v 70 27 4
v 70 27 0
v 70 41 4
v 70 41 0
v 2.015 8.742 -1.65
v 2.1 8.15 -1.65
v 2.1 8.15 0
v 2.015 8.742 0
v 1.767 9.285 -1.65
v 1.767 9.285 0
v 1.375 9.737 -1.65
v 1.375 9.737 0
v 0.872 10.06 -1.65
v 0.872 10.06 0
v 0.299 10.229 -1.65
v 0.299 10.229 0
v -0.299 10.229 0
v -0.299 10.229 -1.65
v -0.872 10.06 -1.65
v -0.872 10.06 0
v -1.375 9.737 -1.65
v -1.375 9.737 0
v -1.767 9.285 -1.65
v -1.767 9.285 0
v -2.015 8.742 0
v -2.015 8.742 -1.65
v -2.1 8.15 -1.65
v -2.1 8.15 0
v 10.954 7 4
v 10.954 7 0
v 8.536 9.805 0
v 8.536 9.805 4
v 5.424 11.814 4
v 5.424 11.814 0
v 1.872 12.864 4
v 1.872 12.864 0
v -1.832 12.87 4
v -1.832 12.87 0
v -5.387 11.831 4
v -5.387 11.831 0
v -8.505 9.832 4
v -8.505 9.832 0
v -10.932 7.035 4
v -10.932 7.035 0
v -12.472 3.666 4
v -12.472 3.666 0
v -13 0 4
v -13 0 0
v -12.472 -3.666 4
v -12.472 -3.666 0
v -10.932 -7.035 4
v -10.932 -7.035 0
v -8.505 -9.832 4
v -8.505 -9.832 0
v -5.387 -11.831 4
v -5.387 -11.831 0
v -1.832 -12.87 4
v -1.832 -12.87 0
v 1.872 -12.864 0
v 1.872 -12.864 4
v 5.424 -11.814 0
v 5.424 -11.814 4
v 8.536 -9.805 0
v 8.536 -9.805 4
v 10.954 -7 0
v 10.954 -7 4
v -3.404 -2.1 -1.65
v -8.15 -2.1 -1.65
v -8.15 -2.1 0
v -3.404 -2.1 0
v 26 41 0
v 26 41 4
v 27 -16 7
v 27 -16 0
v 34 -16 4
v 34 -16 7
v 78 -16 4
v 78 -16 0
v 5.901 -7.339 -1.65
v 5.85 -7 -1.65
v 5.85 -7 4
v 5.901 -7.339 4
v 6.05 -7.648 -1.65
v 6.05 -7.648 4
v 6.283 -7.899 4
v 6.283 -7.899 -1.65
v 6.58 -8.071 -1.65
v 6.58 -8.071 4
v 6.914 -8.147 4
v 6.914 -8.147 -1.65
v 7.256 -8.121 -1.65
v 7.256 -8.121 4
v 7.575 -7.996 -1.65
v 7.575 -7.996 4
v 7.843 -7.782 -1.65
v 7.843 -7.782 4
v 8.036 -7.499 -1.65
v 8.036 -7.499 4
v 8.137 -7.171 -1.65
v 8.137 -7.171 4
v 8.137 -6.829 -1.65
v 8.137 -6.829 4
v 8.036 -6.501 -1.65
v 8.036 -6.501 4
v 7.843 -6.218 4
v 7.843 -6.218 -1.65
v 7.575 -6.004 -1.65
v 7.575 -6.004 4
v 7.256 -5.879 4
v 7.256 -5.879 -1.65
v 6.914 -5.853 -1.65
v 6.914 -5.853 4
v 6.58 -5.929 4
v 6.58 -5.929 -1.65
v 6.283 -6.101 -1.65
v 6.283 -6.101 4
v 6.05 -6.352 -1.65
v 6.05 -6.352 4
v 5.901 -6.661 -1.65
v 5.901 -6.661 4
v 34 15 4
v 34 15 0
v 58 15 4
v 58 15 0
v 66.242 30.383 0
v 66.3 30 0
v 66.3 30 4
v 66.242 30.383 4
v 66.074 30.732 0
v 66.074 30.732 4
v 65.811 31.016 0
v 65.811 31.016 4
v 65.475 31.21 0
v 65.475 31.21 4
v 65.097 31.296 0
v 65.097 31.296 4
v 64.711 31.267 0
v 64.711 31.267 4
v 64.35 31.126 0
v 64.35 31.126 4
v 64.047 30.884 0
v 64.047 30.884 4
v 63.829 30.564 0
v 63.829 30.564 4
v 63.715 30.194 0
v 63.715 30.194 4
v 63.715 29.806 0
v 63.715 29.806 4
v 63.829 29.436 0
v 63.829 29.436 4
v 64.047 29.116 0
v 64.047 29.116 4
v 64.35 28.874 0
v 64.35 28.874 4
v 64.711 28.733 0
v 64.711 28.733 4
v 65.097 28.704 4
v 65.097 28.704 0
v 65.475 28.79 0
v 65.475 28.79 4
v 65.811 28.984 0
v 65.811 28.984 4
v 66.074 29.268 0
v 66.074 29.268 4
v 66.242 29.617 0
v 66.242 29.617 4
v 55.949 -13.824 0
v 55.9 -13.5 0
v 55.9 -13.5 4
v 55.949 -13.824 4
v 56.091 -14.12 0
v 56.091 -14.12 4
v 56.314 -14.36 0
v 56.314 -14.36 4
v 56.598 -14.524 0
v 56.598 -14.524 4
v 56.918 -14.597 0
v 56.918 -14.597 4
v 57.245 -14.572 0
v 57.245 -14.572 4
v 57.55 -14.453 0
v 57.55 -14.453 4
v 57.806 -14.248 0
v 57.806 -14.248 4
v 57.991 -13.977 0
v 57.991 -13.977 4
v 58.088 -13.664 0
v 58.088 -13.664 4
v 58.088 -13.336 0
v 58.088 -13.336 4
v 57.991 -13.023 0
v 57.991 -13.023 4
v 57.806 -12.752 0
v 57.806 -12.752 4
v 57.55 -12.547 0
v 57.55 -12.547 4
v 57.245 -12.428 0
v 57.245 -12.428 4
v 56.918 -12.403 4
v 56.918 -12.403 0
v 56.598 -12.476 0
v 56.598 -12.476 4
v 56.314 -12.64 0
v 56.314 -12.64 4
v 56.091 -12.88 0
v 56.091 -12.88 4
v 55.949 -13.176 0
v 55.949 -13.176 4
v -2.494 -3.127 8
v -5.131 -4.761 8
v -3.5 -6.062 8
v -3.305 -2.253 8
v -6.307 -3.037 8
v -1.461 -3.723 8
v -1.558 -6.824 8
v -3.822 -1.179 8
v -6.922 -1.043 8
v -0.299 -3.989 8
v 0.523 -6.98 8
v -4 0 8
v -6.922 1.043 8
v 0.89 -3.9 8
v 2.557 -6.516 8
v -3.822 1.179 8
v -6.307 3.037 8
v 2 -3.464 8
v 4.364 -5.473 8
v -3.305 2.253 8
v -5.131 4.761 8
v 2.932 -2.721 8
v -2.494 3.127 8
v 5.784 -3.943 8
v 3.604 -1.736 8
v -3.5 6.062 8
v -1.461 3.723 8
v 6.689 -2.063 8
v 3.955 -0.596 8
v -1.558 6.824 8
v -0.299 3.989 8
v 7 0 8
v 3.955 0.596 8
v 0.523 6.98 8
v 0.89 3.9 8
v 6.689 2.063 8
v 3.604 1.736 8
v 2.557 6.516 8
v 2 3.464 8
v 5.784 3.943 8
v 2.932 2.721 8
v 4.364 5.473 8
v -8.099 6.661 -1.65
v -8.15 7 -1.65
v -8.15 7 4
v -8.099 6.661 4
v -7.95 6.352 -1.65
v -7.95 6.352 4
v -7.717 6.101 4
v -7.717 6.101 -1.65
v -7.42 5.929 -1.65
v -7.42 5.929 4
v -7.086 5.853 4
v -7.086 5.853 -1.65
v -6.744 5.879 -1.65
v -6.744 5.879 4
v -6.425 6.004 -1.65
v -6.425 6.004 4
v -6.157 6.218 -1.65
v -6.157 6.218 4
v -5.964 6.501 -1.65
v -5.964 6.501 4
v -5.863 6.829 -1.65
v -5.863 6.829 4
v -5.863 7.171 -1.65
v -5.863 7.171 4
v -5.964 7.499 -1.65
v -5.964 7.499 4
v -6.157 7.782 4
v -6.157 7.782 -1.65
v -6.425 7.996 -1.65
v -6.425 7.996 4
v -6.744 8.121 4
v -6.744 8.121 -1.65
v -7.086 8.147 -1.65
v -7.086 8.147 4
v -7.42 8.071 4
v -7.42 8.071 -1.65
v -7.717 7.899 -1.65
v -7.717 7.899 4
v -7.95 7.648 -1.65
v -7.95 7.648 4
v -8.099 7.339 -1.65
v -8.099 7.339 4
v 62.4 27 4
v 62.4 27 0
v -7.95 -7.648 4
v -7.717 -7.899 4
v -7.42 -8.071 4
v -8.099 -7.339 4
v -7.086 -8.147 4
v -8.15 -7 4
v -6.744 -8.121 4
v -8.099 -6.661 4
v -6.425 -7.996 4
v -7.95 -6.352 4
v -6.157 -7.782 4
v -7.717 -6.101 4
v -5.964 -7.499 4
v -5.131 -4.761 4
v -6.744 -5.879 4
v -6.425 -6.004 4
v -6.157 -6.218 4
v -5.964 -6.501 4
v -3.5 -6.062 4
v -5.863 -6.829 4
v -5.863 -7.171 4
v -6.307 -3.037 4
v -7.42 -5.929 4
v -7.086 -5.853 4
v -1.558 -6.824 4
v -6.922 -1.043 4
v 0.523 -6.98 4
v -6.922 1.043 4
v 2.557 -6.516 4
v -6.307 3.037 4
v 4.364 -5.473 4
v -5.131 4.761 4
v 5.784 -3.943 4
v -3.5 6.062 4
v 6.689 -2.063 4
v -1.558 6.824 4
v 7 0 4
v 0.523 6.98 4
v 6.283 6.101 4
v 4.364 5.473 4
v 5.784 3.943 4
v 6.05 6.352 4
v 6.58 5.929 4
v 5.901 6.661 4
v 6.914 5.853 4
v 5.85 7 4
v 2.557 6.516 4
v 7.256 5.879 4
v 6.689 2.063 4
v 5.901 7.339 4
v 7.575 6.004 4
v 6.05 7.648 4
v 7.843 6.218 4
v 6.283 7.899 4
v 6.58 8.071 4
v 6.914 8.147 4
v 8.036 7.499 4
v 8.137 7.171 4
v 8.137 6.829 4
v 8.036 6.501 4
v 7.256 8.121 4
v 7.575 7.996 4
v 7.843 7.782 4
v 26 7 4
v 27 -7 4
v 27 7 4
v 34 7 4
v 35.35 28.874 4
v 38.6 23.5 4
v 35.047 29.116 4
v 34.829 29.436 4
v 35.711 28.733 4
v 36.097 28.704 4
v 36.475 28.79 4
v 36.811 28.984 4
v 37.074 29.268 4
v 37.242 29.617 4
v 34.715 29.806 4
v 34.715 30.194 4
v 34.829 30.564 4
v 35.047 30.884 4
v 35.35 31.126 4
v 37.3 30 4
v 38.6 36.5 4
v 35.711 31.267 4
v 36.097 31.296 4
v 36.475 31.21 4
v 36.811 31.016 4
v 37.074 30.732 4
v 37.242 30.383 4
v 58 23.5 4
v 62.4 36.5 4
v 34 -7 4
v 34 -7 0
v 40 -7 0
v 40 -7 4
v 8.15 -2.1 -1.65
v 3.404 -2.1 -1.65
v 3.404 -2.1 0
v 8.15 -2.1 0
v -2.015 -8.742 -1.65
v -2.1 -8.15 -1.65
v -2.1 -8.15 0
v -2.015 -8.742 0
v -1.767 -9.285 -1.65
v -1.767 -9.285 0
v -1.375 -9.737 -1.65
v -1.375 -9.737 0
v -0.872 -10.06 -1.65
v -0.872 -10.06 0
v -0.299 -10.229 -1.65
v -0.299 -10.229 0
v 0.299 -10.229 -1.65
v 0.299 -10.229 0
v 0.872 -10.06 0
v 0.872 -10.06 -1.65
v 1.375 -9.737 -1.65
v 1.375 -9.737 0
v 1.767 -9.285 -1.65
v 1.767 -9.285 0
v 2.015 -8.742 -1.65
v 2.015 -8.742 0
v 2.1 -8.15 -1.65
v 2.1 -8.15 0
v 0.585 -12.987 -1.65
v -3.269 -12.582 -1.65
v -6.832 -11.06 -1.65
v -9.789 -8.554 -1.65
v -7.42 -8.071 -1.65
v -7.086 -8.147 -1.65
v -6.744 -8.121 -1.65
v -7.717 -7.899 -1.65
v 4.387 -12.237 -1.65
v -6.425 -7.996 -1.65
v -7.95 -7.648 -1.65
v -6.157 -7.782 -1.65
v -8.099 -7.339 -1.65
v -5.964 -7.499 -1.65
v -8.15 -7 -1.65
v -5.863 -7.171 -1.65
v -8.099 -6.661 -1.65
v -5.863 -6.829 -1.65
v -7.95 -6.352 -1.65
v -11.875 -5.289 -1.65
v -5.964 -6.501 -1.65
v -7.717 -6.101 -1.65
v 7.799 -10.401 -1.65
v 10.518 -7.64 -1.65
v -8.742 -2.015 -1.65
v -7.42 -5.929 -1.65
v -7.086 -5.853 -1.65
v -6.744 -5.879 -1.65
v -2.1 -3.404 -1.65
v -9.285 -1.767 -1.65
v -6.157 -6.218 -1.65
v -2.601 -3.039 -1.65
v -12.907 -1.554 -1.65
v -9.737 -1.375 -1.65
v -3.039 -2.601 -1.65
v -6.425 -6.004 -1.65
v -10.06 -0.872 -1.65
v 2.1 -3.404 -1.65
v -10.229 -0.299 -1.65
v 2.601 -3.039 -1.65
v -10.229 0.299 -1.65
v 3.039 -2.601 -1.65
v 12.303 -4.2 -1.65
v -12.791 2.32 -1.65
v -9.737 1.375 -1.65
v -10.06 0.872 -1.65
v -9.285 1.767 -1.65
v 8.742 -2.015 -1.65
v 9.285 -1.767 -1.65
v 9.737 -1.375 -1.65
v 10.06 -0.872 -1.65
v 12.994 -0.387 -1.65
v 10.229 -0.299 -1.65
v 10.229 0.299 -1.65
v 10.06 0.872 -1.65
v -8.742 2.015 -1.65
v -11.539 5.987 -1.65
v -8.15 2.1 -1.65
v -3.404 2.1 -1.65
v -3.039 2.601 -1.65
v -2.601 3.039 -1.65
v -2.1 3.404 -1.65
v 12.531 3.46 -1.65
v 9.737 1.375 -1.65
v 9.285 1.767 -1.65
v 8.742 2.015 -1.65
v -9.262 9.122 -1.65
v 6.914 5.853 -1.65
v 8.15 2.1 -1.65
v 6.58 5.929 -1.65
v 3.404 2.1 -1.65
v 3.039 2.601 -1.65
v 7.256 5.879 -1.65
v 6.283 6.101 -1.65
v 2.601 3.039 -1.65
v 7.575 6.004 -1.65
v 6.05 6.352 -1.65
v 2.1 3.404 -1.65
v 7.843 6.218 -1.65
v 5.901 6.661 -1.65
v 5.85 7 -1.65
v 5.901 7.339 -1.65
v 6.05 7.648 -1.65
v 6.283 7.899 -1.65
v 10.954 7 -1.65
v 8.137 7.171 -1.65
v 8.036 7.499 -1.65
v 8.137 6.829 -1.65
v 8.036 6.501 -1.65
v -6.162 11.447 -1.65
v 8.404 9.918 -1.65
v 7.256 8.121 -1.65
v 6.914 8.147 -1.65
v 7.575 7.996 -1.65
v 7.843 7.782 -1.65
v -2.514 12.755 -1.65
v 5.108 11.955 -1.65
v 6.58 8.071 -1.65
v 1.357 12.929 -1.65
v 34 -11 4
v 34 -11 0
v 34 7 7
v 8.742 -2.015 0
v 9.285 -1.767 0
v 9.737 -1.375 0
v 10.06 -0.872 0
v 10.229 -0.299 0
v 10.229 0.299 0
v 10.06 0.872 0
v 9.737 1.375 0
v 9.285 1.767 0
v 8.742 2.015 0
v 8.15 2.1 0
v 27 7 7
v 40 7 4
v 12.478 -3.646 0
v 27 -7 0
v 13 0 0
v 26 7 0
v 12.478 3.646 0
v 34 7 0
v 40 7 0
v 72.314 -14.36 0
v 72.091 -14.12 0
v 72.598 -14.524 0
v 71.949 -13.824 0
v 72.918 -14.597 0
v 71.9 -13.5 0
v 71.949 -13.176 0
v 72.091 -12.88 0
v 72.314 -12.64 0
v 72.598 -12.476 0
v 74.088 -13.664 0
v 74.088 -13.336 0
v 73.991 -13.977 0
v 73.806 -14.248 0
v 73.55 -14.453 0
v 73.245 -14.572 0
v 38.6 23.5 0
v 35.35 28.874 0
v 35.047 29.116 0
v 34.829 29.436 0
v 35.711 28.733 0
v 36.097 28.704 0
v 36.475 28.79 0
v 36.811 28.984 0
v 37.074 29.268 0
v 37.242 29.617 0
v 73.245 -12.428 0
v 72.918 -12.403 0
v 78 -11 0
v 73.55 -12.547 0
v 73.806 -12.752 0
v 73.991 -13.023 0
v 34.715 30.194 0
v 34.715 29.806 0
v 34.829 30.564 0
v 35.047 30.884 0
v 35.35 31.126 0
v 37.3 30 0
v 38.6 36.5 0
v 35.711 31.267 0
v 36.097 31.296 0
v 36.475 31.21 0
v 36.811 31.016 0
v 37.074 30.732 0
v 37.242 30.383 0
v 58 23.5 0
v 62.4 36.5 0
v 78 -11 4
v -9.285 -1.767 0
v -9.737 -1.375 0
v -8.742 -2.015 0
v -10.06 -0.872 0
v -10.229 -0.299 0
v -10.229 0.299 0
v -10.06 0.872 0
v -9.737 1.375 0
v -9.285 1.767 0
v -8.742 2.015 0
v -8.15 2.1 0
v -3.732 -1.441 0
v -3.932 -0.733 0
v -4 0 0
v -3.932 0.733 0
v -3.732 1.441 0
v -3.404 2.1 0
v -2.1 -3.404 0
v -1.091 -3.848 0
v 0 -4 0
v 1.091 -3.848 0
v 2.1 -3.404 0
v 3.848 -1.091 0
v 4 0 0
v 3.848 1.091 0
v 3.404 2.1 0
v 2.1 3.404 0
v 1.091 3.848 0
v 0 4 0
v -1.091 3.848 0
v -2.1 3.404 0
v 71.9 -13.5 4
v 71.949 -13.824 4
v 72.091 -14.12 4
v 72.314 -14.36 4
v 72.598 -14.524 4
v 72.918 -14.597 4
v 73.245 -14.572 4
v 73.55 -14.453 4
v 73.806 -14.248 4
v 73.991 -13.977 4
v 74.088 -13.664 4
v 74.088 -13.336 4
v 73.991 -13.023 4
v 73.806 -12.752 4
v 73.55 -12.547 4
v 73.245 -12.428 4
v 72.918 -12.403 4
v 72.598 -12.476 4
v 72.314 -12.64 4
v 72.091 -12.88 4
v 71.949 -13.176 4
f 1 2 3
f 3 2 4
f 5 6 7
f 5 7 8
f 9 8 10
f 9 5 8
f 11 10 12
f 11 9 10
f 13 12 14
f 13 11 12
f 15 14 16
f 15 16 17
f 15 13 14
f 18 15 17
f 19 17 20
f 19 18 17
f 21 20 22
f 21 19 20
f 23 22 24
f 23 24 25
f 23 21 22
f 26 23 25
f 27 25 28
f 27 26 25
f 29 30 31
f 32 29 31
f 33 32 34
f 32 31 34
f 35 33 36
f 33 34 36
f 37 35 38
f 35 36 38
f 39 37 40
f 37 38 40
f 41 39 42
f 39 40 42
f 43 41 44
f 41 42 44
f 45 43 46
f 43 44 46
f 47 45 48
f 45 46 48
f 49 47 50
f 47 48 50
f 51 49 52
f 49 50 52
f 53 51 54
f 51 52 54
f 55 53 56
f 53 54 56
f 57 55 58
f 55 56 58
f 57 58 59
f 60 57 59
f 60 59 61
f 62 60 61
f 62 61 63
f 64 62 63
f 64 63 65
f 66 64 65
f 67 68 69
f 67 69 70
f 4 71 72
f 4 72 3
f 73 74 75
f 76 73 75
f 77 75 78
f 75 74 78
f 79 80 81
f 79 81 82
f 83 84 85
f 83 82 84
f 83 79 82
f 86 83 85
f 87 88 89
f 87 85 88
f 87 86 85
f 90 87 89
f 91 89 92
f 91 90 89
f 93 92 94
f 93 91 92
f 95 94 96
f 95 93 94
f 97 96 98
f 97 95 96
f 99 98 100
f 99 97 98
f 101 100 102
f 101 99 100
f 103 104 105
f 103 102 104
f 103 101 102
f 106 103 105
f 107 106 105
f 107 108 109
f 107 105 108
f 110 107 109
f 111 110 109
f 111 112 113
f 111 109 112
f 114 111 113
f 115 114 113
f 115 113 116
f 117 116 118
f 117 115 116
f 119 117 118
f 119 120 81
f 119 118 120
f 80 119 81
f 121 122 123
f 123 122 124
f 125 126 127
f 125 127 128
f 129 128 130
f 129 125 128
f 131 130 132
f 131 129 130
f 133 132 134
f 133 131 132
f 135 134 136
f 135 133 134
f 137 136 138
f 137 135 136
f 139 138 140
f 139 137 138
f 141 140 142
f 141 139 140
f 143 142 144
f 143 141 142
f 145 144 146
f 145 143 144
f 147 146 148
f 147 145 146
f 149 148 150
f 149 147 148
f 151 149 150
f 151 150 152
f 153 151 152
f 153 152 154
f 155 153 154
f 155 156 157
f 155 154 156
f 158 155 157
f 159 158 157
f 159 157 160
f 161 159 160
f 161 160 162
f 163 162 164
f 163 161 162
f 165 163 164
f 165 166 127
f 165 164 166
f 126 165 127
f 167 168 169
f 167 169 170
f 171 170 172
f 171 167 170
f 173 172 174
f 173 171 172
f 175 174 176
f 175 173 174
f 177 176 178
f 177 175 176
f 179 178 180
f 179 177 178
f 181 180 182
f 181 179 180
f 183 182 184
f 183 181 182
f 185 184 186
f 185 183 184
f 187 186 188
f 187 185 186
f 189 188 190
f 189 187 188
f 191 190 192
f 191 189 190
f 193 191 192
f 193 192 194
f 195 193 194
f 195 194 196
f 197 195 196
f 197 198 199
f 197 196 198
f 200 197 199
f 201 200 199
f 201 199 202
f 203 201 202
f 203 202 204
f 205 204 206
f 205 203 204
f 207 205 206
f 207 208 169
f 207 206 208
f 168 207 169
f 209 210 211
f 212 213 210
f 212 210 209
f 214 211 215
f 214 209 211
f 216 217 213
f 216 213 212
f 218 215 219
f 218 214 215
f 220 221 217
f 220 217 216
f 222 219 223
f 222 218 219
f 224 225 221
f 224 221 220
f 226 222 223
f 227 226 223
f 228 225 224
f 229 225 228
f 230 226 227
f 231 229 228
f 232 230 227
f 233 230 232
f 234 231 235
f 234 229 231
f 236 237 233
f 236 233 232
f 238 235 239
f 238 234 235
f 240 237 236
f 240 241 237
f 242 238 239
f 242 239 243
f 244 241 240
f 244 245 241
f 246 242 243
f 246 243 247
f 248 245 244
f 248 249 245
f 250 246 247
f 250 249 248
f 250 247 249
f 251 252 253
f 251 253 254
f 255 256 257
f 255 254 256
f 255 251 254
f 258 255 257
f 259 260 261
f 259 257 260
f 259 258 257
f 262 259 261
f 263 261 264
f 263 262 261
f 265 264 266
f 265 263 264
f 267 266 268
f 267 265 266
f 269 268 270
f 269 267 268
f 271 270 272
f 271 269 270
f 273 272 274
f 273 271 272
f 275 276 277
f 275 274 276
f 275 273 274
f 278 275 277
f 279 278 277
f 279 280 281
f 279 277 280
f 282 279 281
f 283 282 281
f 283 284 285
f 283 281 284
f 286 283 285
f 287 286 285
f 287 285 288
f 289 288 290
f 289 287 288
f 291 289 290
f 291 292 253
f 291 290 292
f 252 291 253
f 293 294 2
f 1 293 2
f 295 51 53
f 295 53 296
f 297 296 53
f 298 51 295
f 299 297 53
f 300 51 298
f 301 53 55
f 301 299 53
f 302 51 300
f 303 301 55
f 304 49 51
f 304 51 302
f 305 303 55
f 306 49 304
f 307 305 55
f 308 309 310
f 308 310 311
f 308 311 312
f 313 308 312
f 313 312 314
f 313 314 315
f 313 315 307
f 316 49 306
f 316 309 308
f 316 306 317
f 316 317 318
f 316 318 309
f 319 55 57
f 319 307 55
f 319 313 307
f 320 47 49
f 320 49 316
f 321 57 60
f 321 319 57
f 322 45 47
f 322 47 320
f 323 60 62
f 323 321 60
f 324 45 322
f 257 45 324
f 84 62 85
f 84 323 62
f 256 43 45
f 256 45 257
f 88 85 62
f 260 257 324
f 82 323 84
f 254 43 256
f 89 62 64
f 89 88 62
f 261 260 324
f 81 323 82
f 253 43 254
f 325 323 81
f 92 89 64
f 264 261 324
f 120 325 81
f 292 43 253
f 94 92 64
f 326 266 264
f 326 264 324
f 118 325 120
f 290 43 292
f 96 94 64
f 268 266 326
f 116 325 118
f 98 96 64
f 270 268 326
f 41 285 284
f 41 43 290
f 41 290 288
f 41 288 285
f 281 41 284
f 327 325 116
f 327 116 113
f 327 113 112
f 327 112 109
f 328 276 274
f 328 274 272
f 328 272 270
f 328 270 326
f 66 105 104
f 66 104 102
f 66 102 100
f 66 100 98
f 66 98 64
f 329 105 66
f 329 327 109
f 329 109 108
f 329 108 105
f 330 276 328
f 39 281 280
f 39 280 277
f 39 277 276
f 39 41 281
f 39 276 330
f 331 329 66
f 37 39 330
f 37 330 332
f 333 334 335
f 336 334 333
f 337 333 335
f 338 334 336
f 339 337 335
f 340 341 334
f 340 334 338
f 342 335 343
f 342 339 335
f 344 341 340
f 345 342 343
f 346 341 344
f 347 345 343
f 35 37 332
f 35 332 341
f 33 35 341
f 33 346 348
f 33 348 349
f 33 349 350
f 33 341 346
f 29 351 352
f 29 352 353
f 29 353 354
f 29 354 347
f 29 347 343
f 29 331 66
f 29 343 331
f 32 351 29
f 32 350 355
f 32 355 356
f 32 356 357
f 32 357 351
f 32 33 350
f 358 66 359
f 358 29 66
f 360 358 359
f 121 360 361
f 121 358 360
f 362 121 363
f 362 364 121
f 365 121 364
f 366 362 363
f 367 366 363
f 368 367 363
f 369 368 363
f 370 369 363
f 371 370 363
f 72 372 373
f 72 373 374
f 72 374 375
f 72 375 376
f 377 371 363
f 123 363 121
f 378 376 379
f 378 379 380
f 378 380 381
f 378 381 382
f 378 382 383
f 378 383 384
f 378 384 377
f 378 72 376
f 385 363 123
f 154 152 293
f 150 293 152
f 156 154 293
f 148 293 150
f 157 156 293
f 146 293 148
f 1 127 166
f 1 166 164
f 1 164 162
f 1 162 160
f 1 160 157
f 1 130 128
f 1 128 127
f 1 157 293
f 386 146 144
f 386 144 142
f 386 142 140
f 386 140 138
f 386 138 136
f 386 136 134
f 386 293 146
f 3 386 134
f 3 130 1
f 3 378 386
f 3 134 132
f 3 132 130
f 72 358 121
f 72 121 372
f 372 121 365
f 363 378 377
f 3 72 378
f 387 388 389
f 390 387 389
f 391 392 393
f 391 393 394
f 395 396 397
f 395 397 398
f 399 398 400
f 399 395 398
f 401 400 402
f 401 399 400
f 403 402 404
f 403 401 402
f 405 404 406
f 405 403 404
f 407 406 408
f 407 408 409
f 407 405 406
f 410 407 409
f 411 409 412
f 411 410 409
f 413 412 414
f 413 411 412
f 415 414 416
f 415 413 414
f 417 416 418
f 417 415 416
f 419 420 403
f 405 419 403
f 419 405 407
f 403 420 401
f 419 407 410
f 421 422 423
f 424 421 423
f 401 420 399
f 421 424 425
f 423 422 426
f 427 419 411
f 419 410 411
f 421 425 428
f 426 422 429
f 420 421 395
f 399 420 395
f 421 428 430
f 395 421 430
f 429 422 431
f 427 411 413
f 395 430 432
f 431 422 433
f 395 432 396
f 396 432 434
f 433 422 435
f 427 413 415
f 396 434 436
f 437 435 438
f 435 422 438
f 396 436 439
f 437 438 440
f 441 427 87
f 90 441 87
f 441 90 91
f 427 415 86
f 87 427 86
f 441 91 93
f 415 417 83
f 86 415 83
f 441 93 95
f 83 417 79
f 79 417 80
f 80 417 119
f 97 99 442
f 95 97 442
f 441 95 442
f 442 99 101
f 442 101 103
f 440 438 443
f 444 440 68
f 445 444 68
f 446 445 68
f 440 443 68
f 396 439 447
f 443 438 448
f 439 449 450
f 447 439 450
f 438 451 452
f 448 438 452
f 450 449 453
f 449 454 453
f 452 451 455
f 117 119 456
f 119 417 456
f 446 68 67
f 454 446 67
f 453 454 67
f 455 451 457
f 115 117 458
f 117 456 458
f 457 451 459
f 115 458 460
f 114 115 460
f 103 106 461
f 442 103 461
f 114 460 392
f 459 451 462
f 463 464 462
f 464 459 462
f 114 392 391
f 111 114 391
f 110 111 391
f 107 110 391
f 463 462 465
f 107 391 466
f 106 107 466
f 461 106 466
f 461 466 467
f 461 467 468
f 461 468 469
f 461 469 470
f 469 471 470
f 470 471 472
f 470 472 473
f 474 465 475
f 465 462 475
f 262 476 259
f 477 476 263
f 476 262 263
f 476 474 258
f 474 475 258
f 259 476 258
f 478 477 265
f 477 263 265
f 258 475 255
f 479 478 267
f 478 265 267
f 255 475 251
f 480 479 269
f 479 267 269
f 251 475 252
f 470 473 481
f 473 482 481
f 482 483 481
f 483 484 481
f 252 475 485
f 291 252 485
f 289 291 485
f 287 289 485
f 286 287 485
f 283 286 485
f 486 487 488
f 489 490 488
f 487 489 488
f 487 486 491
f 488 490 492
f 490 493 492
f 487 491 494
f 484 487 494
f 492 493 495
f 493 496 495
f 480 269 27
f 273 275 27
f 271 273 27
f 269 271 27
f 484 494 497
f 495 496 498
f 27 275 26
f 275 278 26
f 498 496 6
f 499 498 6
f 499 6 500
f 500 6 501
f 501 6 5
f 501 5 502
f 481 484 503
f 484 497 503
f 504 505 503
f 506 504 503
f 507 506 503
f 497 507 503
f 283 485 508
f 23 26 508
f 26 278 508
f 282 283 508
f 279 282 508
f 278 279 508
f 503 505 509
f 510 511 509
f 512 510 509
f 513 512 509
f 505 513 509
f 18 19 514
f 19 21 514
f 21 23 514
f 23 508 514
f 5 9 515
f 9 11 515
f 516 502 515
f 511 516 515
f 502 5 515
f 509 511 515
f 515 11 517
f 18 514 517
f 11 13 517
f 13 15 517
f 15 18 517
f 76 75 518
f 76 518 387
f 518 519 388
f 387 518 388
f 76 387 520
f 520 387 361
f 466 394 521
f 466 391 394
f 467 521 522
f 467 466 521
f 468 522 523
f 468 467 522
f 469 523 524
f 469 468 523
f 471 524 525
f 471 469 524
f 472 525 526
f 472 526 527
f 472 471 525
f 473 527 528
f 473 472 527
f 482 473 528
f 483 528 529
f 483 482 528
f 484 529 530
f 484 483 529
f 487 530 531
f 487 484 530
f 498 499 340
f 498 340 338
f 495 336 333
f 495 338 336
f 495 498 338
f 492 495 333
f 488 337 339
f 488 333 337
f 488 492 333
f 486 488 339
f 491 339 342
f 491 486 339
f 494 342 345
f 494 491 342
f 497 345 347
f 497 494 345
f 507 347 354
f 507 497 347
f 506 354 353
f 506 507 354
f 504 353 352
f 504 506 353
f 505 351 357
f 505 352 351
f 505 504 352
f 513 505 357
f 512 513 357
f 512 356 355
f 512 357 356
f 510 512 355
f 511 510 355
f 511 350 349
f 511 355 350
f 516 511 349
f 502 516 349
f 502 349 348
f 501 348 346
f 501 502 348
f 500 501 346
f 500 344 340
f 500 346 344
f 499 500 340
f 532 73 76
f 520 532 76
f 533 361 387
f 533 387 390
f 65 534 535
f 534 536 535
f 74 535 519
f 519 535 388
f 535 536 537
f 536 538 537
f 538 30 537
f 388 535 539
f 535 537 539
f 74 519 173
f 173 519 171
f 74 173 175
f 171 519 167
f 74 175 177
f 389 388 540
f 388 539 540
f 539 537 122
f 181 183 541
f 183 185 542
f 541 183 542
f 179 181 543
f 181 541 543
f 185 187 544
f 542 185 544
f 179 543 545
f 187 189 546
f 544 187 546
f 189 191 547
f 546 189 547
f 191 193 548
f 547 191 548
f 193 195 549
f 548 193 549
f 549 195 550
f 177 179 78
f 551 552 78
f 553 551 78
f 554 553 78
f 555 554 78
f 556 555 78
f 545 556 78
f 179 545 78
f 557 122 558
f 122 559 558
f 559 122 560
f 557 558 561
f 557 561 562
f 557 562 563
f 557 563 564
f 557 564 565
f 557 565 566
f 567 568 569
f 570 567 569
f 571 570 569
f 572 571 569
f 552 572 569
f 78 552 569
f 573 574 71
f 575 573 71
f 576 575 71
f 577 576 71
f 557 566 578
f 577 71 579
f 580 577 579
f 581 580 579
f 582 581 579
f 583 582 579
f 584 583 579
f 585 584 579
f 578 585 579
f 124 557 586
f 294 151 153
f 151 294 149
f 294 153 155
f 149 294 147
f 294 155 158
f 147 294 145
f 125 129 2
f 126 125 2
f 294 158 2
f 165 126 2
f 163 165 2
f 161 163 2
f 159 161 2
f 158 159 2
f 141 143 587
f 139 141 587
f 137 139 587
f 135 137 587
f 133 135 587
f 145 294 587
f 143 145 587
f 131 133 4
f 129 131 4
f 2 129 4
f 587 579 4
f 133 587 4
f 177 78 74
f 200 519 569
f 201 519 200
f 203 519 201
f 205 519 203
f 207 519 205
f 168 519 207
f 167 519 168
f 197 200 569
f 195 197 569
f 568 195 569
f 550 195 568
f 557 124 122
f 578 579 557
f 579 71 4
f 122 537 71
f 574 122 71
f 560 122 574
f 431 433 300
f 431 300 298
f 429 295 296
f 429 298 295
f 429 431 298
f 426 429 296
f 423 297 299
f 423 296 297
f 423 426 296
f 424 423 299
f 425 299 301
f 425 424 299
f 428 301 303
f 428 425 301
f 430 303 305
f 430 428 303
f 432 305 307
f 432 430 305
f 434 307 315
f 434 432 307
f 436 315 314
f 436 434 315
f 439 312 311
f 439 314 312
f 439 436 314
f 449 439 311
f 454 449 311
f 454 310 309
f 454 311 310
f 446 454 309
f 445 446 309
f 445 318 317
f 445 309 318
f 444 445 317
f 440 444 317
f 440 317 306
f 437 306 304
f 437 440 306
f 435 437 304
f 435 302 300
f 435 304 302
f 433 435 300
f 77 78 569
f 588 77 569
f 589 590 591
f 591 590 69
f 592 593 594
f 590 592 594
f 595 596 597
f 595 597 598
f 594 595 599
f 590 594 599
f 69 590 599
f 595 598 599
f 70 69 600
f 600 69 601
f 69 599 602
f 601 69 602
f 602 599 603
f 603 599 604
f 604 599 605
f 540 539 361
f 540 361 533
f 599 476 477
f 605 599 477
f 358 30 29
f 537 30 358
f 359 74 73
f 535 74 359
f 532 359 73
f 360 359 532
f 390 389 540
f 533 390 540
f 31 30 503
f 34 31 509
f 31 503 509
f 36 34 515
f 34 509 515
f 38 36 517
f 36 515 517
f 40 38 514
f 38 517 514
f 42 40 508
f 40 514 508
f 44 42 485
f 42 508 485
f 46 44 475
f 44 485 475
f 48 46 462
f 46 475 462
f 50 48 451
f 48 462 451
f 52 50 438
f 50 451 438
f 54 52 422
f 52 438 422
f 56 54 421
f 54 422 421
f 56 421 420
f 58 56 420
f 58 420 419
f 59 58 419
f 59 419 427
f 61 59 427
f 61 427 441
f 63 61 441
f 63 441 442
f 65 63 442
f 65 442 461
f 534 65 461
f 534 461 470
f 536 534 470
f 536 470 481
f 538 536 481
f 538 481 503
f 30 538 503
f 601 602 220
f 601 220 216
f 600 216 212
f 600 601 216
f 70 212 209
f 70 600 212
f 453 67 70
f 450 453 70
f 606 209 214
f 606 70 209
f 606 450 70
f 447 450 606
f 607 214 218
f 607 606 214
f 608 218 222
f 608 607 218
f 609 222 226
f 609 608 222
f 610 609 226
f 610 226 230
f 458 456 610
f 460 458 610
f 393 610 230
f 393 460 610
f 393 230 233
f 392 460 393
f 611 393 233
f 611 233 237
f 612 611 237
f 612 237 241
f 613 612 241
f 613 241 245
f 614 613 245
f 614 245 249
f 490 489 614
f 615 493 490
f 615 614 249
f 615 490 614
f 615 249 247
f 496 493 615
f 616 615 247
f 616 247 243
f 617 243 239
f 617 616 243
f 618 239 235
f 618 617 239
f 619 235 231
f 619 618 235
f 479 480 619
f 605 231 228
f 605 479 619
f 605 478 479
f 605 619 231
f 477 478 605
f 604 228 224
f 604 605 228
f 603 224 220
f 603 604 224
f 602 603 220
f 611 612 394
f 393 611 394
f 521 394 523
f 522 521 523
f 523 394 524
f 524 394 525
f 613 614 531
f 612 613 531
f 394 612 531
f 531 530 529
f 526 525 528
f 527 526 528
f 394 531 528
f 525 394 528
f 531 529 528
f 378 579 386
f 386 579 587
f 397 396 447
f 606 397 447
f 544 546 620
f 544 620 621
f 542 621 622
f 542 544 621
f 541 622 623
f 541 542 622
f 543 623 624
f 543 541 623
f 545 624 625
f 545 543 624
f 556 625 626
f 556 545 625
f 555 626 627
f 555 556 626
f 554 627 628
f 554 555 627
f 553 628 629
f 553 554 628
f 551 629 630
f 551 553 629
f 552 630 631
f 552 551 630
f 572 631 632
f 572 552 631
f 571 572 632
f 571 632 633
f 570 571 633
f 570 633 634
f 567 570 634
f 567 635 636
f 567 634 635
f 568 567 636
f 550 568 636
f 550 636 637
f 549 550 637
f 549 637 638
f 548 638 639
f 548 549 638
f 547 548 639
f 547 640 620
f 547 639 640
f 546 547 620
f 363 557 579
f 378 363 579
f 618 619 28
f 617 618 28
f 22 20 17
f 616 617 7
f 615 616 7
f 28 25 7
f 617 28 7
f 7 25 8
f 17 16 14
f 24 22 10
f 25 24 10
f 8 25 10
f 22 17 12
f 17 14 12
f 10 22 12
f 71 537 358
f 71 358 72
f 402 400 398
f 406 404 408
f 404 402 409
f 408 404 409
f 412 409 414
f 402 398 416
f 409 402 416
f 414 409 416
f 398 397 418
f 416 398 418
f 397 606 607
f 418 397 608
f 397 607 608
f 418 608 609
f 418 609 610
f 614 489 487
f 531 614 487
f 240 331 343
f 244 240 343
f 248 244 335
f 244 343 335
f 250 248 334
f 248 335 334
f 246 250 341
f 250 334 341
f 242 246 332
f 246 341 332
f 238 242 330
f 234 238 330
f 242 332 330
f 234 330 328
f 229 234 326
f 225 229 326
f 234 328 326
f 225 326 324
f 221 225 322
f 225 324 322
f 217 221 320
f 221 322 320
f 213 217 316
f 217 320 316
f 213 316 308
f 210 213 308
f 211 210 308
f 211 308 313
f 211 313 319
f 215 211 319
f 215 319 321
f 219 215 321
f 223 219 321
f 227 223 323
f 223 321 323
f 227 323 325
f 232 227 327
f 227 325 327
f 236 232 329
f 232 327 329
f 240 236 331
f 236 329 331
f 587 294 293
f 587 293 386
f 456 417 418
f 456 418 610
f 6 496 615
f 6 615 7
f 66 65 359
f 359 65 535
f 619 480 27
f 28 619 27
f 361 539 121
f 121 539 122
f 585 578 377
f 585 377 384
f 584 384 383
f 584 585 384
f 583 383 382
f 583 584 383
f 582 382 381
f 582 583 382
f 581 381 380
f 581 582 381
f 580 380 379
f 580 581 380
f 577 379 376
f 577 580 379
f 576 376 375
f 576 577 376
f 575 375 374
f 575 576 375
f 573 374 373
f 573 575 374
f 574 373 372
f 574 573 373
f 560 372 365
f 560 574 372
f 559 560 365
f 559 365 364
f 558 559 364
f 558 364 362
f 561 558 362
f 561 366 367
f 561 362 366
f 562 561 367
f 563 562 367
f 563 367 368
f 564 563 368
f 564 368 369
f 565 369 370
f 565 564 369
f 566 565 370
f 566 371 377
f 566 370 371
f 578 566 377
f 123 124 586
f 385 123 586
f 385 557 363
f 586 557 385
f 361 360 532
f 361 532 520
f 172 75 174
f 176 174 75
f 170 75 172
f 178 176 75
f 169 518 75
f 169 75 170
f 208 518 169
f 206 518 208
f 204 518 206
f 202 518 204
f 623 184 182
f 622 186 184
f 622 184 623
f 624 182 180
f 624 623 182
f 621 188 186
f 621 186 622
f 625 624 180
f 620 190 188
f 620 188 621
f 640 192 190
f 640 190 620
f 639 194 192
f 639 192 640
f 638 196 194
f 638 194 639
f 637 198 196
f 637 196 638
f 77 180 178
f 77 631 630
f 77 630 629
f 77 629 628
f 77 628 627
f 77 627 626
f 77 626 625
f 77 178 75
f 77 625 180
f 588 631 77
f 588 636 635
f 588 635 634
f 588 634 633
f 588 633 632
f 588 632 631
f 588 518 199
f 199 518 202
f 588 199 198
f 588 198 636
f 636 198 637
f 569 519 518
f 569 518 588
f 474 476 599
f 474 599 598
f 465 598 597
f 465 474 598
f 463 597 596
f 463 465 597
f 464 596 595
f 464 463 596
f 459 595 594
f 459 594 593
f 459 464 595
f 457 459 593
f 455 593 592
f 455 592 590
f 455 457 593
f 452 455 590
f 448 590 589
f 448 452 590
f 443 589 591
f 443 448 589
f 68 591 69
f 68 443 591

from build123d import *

# Parameters (mm, degrees)
ELBOW_HORN_FLANGE_PROFILE_R          = 13
ELBOW_HORN_FLANGE_DEPTH              = 4
FOREARM_WEB_PROFILE_W                = 40
FOREARM_WEB_PROFILE_H                = 14
FOREARM_WEB_DEPTH                    = 4
GRIPPER_MOUNT_RIB_PROFILE_W          = 8
GRIPPER_MOUNT_RIB_PROFILE_H          = 30
GRIPPER_MOUNT_RIB_DEPTH              = 4
GRIPPER_SERVO_MOUNT_PROFILE_W        = 44
GRIPPER_SERVO_MOUNT_PROFILE_H        = 26
GRIPPER_SERVO_MOUNT_DEPTH            = 4
GRIP_SG90_BODY_CLEARANCE_START       = -5
GRIP_SG90_BODY_CLEARANCE_PROFILE_W   = 23.8
GRIP_SG90_BODY_CLEARANCE_PROFILE_H   = 13
GRIP_SG90_BODY_CLEARANCE_DEPTH       = 87.221918224
MOVING_FINGER_SWEEP_RELIEF_START     = -5
MOVING_FINGER_SWEEP_RELIEF_PROFILE_W = 13
MOVING_FINGER_SWEEP_RELIEF_PROFILE_H = 13
MOVING_FINGER_SWEEP_RELIEF_DEPTH     = 87.221918224
GRIP_SERVO_TAB_FASTENERS_START       = -50
GRIP_SERVO_TAB_FASTENERS_PROFILE_R   = 1.3
GRIP_SERVO_TAB_FASTENERS_DEPTH       = 132.221918224
FIXED_FINGER_SPINE_PROFILE_W         = 48
FIXED_FINGER_SPINE_PROFILE_H         = 5
FIXED_FINGER_SPINE_DEPTH             = 4
FIXED_FINGER_ROOT_PROFILE_W          = 7
FIXED_FINGER_ROOT_PROFILE_H          = 23
FIXED_FINGER_ROOT_DEPTH              = 7
ELBOW_CENTER_SCREW_ACCESS_START      = -50
ELBOW_CENTER_SCREW_ACCESS_PROFILE_R  = 4
ELBOW_CENTER_SCREW_ACCESS_DEPTH      = 139.396832522
ELBOW_DOWEL_SUPPORT_HUB_START        = 4
ELBOW_DOWEL_SUPPORT_HUB_PROFILE_R    = 7
ELBOW_DOWEL_SUPPORT_HUB_PROFILE_R_2  = 4
ELBOW_DOWEL_SUPPORT_HUB_DEPTH        = 4
CAPTURED_HORN_KEY_BOSS_START         = -1.65
CAPTURED_HORN_KEY_BOSS_PROFILE_R     = 13
CAPTURED_HORN_KEY_BOSS_DEPTH         = 1.65
KEY_POCKET_HUB_START                 = -1.65
STOCK_HORN_POCKET_HUB_R              = 3.55
KEY_POCKET_HUB_DEPTH                 = 1.65
KEY_POCKET_HORIZONTAL_START          = -1.65
STOCK_HORN_POCKET_HORIZONTAL_W       = 16.3
STOCK_HORN_POCKET_HORIZONTAL_H       = 4.2
KEY_POCKET_HORIZONTAL_DEPTH          = 1.65
KEY_POCKET_VERTICAL_START            = -1.65
STOCK_HORN_POCKET_VERTICAL_W         = 4.2
STOCK_HORN_POCKET_VERTICAL_H         = 16.3
KEY_POCKET_VERTICAL_DEPTH            = 1.65
KEY_POCKET_ROUNDED_TIPS_START        = -1.65
STOCK_HORN_POCKET_ROUNDED_TIPS_R     = 2.1
KEY_POCKET_ROUNDED_TIPS_DEPTH        = 1.65
UNMODIFIED_HORN_CAPTURE_M2_START     = -50
UNMODIFIED_HORN_CAPTURE_M2_PROFILE_R = 1.15
UNMODIFIED_HORN_CAPTURE_M2_DEPTH     = 139.481636513
HUB_CLEARANCE_IN_KEY_BOSS_ONLY_START = -1.65
HORN_CENTER_HUB_CLEARANCE_R          = 4
HUB_CLEARANCE_IN_KEY_BOSS_ONLY_DEPTH = 1.65
FIXED_PAD_KEEPER_FASTENERS_START     = -50
FIXED_PAD_KEEPER_FASTENERS_PROFILE_R = 1.1
FIXED_PAD_KEEPER_FASTENERS_DEPTH     = 139.481636513


with BuildPart() as part:
    # Elbow_horn_flange_profile → Elbow_horn_flange (new body)
    with BuildSketch(Plane.XY):
        Circle(ELBOW_HORN_FLANGE_PROFILE_R)
    extrude(amount=ELBOW_HORN_FLANGE_DEPTH)

    # Forearm_web_profile → Forearm_web (add)
    with BuildSketch(Plane.XY):
        with Locations((20, 0)):
            Rectangle(FOREARM_WEB_PROFILE_W, FOREARM_WEB_PROFILE_H)
    extrude(amount=FOREARM_WEB_DEPTH)

    # Gripper_mount_rib_profile → Gripper_mount_rib (add)
    with BuildSketch(Plane.XY):
        with Locations((30, 15)):
            Rectangle(GRIPPER_MOUNT_RIB_PROFILE_W, GRIPPER_MOUNT_RIB_PROFILE_H)
    extrude(amount=GRIPPER_MOUNT_RIB_DEPTH)

    # Gripper_servo_mount_profile → Gripper_servo_mount (add)
    with BuildSketch(Plane.XY):
        with Locations((48, 28)):
            Rectangle(GRIPPER_SERVO_MOUNT_PROFILE_W, GRIPPER_SERVO_MOUNT_PROFILE_H)
    extrude(amount=GRIPPER_SERVO_MOUNT_DEPTH)

    # Grip_SG90_body_clearance_profile → Grip_SG90_body_clearance (cut, through all)
    with BuildSketch(Plane.XY.offset(GRIP_SG90_BODY_CLEARANCE_START)):
        with Locations((50.5, 30)):
            Rectangle(GRIP_SG90_BODY_CLEARANCE_PROFILE_W, GRIP_SG90_BODY_CLEARANCE_PROFILE_H)
    extrude(amount=GRIP_SG90_BODY_CLEARANCE_DEPTH, mode=Mode.SUBTRACT)

    # Moving_finger_sweep_relief_profile → Moving_finger_sweep_relief (cut, through all)
    with BuildSketch(Plane.XY.offset(MOVING_FINGER_SWEEP_RELIEF_START)):
        with Locations((64.5, 20.5)):
            Rectangle(MOVING_FINGER_SWEEP_RELIEF_PROFILE_W, MOVING_FINGER_SWEEP_RELIEF_PROFILE_H)
    extrude(amount=MOVING_FINGER_SWEEP_RELIEF_DEPTH, mode=Mode.SUBTRACT)

    # Grip_servo_tab_fasteners_profile → Grip_servo_tab_fasteners (cut, through all)
    with BuildSketch(Plane.XY.offset(GRIP_SERVO_TAB_FASTENERS_START)):
        with Locations((36, 30)):
            Circle(GRIP_SERVO_TAB_FASTENERS_PROFILE_R)
        with Locations((65, 30)):
            Circle(GRIP_SERVO_TAB_FASTENERS_PROFILE_R)
    extrude(amount=GRIP_SERVO_TAB_FASTENERS_DEPTH, mode=Mode.SUBTRACT)



with BuildPart() as body_2:
    # Fixed_finger_spine_profile → Fixed_finger_spine (new body)
    with BuildSketch(Plane.XY):
        with Locations((54, -13.5)):
            Rectangle(FIXED_FINGER_SPINE_PROFILE_W, FIXED_FINGER_SPINE_PROFILE_H)
    extrude(amount=FIXED_FINGER_SPINE_DEPTH)


with BuildPart() as part_1:
    add(part.part)

    add(body_2.part)  # Fixed_finger_root merges body 2
    # Fixed_finger_root_profile → Fixed_finger_root (add)
    with BuildSketch(Plane.XY):
        with Locations((30.5, -4.5)):
            Rectangle(FIXED_FINGER_ROOT_PROFILE_W, FIXED_FINGER_ROOT_PROFILE_H)
    extrude(amount=FIXED_FINGER_ROOT_DEPTH)

    # Elbow_center_screw_access_profile → Elbow_center_screw_access (cut, through all)
    with BuildSketch(Plane.XY.offset(ELBOW_CENTER_SCREW_ACCESS_START)):
        with Locations(Location((0, 0, 0), (0, 0, 180))):
            Circle(ELBOW_CENTER_SCREW_ACCESS_PROFILE_R)
    extrude(amount=ELBOW_CENTER_SCREW_ACCESS_DEPTH, mode=Mode.SUBTRACT)

    # Elbow_dowel_support_hub_profile → Elbow_dowel_support_hub (add)
    with BuildSketch(Plane.XY.offset(ELBOW_DOWEL_SUPPORT_HUB_START)):
        Circle(ELBOW_DOWEL_SUPPORT_HUB_PROFILE_R)
        with Locations(Location((0, 0, 0), (0, 0, 180))):
            Circle(ELBOW_DOWEL_SUPPORT_HUB_PROFILE_R_2, mode=Mode.SUBTRACT)
    extrude(amount=ELBOW_DOWEL_SUPPORT_HUB_DEPTH)

    # Captured_horn_key_boss_profile → Captured_horn_key_boss (add)
    with BuildSketch(Plane.XY.offset(CAPTURED_HORN_KEY_BOSS_START)):
        with Locations(Location((0, 0, 0), (0, 0, 32.578970393))):
            Circle(CAPTURED_HORN_KEY_BOSS_PROFILE_R)
    extrude(amount=CAPTURED_HORN_KEY_BOSS_DEPTH)

    # Stock_horn_pocket_Hub → Key_pocket_Hub (cut)
    with BuildSketch(Plane.XY.offset(KEY_POCKET_HUB_START)):
        Circle(STOCK_HORN_POCKET_HUB_R)
    extrude(amount=KEY_POCKET_HUB_DEPTH, mode=Mode.SUBTRACT)

    # Stock_horn_pocket_Horizontal → Key_pocket_Horizontal (cut)
    with BuildSketch(Plane.XY.offset(KEY_POCKET_HORIZONTAL_START)):
        Rectangle(STOCK_HORN_POCKET_HORIZONTAL_W, STOCK_HORN_POCKET_HORIZONTAL_H)
    extrude(amount=KEY_POCKET_HORIZONTAL_DEPTH, mode=Mode.SUBTRACT)

    # Stock_horn_pocket_Vertical → Key_pocket_Vertical (cut)
    with BuildSketch(Plane.XY.offset(KEY_POCKET_VERTICAL_START)):
        Rectangle(STOCK_HORN_POCKET_VERTICAL_W, STOCK_HORN_POCKET_VERTICAL_H)
    extrude(amount=KEY_POCKET_VERTICAL_DEPTH, mode=Mode.SUBTRACT)

    # Stock_horn_pocket_Rounded_tips → Key_pocket_Rounded_tips (cut)
    with BuildSketch(Plane.XY.offset(KEY_POCKET_ROUNDED_TIPS_START)):
        with Locations((8.15, 0)):
            Circle(STOCK_HORN_POCKET_ROUNDED_TIPS_R)
        with Locations((-8.15, 0)):
            Circle(STOCK_HORN_POCKET_ROUNDED_TIPS_R)
        with Locations((0, 8.15)):
            Circle(STOCK_HORN_POCKET_ROUNDED_TIPS_R)
        with Locations((0, -8.15)):
            Circle(STOCK_HORN_POCKET_ROUNDED_TIPS_R)
    extrude(amount=KEY_POCKET_ROUNDED_TIPS_DEPTH, mode=Mode.SUBTRACT)

    # Unmodified_horn_capture_M2_profile → Unmodified_horn_capture_M2 (cut, through all)
    with BuildSketch(Plane.XY.offset(UNMODIFIED_HORN_CAPTURE_M2_START)):
        with Locations(Location((7, 7, 0), (0, 0, 180))):
            Circle(UNMODIFIED_HORN_CAPTURE_M2_PROFILE_R)
        with Locations(Location((-7, 7, 0), (0, 0, 180))):
            Circle(UNMODIFIED_HORN_CAPTURE_M2_PROFILE_R)
        with Locations(Location((-7, -7, 0), (0, 0, 180))):
            Circle(UNMODIFIED_HORN_CAPTURE_M2_PROFILE_R)
        with Locations(Location((7, -7, 0), (0, 0, 180))):
            Circle(UNMODIFIED_HORN_CAPTURE_M2_PROFILE_R)
    extrude(amount=UNMODIFIED_HORN_CAPTURE_M2_DEPTH, mode=Mode.SUBTRACT)

    # Horn_center_hub_clearance → Hub_clearance_in_key_boss_only (cut)
    with BuildSketch(Plane.XY.offset(HUB_CLEARANCE_IN_KEY_BOSS_ONLY_START)):
        with Locations(Location((0, 0, 0), (0, 0, 148.331756746))):
            Circle(HORN_CENTER_HUB_CLEARANCE_R)
    extrude(amount=HUB_CLEARANCE_IN_KEY_BOSS_ONLY_DEPTH, mode=Mode.SUBTRACT)

    # Fixed_pad_keeper_fasteners_profile → Fixed_pad_keeper_fasteners (cut, through all)
    with BuildSketch(Plane.XY.offset(FIXED_PAD_KEEPER_FASTENERS_START)):
        with Locations(Location((57, -13.5, 0), (0, 0, 180))):
            Circle(FIXED_PAD_KEEPER_FASTENERS_PROFILE_R)
        with Locations(Location((73, -13.5, 0), (0, 0, 180))):
            Circle(FIXED_PAD_KEEPER_FASTENERS_PROFILE_R)
    extrude(amount=FIXED_PAD_KEEPER_FASTENERS_DEPTH, mode=Mode.SUBTRACT)


solid = part_1.part
